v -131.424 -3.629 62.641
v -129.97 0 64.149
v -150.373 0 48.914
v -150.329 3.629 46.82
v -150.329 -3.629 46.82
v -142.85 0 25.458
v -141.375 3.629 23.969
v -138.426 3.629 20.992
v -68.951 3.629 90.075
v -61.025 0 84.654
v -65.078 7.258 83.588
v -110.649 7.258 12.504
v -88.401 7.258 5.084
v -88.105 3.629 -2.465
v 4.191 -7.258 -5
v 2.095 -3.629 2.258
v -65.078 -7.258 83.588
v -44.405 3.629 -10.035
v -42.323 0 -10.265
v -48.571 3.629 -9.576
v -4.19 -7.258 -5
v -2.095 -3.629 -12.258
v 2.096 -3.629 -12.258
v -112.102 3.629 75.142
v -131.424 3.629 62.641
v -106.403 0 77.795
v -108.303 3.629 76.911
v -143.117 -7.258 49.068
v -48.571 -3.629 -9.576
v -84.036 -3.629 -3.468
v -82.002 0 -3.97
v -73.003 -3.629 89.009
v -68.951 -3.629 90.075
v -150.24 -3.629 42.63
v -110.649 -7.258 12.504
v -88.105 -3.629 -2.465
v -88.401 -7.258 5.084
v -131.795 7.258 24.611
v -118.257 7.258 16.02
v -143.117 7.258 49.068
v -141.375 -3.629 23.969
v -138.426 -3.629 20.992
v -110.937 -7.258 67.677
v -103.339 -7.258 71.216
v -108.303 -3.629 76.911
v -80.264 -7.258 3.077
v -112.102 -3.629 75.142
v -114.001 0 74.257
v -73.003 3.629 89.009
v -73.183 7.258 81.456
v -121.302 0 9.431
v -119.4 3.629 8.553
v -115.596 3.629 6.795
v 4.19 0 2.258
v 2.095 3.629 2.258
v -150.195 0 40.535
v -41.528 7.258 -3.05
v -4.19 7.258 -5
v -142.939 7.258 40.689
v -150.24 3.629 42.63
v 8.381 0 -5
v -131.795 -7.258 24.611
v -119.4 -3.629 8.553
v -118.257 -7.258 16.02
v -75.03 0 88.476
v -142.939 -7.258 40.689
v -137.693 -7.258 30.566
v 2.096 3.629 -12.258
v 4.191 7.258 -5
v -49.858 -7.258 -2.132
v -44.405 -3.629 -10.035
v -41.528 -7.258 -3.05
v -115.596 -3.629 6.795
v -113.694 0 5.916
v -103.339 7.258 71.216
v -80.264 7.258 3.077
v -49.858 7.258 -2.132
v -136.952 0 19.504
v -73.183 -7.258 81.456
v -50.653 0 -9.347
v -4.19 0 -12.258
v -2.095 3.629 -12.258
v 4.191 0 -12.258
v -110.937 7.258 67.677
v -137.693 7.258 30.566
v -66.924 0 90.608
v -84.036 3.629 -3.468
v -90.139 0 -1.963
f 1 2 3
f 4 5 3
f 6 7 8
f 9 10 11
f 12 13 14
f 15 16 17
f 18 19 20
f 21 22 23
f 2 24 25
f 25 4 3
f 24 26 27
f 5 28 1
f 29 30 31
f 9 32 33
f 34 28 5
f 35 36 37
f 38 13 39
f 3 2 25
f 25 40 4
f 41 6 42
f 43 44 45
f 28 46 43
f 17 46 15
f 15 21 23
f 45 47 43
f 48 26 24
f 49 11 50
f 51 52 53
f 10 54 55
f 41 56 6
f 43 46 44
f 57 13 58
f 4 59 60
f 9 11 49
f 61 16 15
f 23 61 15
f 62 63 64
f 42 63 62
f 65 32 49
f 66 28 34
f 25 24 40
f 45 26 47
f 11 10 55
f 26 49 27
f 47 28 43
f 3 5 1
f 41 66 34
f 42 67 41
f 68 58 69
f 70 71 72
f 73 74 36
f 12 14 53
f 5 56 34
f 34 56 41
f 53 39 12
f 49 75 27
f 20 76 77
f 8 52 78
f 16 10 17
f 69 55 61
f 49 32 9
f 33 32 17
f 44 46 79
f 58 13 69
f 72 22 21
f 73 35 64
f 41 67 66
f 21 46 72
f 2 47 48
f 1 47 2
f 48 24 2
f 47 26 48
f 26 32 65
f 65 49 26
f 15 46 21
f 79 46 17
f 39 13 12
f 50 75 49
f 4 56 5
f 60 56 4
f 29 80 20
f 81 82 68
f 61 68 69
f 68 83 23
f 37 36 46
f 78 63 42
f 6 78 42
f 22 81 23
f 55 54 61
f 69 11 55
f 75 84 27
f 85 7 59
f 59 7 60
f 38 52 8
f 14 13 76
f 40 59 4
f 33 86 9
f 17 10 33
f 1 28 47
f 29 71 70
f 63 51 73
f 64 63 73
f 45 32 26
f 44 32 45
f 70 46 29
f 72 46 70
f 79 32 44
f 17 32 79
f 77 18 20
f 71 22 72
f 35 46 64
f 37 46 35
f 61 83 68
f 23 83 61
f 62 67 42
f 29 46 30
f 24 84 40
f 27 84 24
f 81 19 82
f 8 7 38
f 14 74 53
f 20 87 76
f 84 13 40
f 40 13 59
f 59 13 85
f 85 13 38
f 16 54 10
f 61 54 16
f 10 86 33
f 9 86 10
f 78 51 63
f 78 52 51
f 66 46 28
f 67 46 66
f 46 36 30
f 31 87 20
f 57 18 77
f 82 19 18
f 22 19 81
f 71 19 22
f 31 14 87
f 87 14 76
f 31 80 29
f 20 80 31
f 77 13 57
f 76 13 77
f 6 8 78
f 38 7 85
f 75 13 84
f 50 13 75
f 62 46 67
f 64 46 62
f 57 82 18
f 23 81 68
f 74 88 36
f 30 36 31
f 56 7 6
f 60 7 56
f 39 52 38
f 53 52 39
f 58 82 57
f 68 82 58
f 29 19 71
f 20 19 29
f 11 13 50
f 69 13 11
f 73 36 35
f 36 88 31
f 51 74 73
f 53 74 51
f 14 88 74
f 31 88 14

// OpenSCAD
// No Preview. Just hit Create.   Always leave Part at 1"
part=1;//[1,2,3,4,5,6]
/* [Hidden] */
LOA=rnd(900,2000);
Stern=LOA*rnd(-0.1,0.3);
Bow=LOA*rnd(-0.1,0.3);
Beam=LOA*rnd(0.05,0.3);
BeamHeight=min(Beam*rnd(0.4,1),LOA*0.1);
SternHeight=BeamHeight*rnd(0.9,3);
BowHeight=max(SternHeight*rnd(0.9,2),BeamHeight*rnd(0.9,3));;

KeelBase=LOA-Stern-Beam;
KeelLine=[
[0,0,0], 
[KeelBase*rnd(0.0,0.3),0,-KeelBase*rnd(-0.1,0.1)], 
[KeelBase*rnd(0.3,0.6),0,-KeelBase*rnd(-0.1,0.1)],
[KeelBase*rnd(0.6,0.9),0,-KeelBase*rnd(-0.1,0.1)],
[KeelBase-1,0,0],
[KeelBase-1,0,0]];
BottomLine=[
[0,0,0],
[KeelBase*rnd(0,0.3),Beam*rnd(0.1,1.5),1],
[KeelBase*rnd(0.3,0.6),Beam*rnd(0.1,2),1],
[KeelBase*rnd(0.6,0.9),Beam*rnd(0.1,3),1],
[KeelBase,0,1],
[KeelBase,0,1]];
bowbend=rnd(-1,3);
WaterLine=[
[-Stern*rnd(0.1,0.9),0,SternHeight/2],
[-Stern*rnd(0.1,0.9),Beam*rnd(0.5,2),SternHeight/2],
[KeelBase*rnd(0,2),Beam*rnd(0.5,3),BeamHeight/2],
[KeelBase+Bow*bowbend,0,BowHeight/2],
[KeelBase+Bow*bowbend,0,BowHeight/2]];
beamstern=[-Stern*rnd(-0.1,1),0,SternHeight];
BeamLine=[
beamstern,
[beamstern[0]+Beam*rnd(0,1),Beam*rnd(0.15,1.5),(BeamHeight+SternHeight)/2],
[KeelBase*rnd(0.0,0.5),Beam*rnd(0.15,2),BeamHeight],
[(KeelBase+Bow)*rnd(0.5,1),Beam*rnd(0.15,2),(BeamHeight+BowHeight)/2],
[KeelBase+Bow,0,BowHeight],
[KeelBase+Bow,0,BowHeight]];
KeelBow=concat(
[
BottomLine[len(BottomLine)-1],
WaterLine[len(WaterLine)-1],
BeamLine[len(BeamLine)-1]]);

SternLine=[BeamLine[0],WaterLine[0],BottomLine[0],KeelLine[0]];
RudderLine=[WaterLine[0]+[0,0,LOA*0.03],WaterLine[0]-[LOA*rnd(0.03,0.2),0,0],BottomLine[0]-[LOA*rnd(0.03,0.2),0,0],KeelLine[0]];
tiny=[0.0001,0.0001,0.0001];
Clinked=rnd(0,1);
openhull=sign(rnd(-1,1));
nummasts= floor(rnd(0,4));
////////////////////////////////////////////////////////////////////////////////////////////////////////////////////////////////////////////////////////



  union(){
 masts(nummasts);
   * BoatHull(0,0,16,Clinked);
    }
//*render()
difference(){
    
    union(){
    if(floor(rnd(0,5))!=0 ||openhull>0){ Railings();}
    BoatHull(0,0,16,Clinked);
    }

    union(){
   if(floor(rnd(0,2))!=0){ Middeck();}
   
    translate(tiny)BoatHull(LOA/50,LOA/50*openhull,16);
    }
 

    }       
if (nummasts>0){
intersection(){    

    mirrorextrudeT(WaterLine,16,0.05,0.99){
    translate([0,-LOA/50,0]) scale(3) cube([LOA/1000,LOA/1000,LOA/200],center=true);
    }    
    
    BoatHull(LOA/400,0,10);
    }}
ctrl();

/////////////////////////////////////////////////////////////////////////////////////////////////////////////////////////////////////////////////////////////////////////////////////////////////////////////////////////////////
module Railings(){
    

mirrorcopy([0,-1,0]){
    extrudeT(BeamLine,16,0,1){
    translate([0,0,0]) scale(2.5) cylinder(LOA/100,LOA/300,LOA/300,center=true,$fn =6);
    }  }
    


extrudeT(KeelBow,16,-0.07,1){
    translate([0,0,-5]) scale(3) cube([LOA/200,LOA/150,LOA/150],center=true);
    }
/*extrudeT(KeelLine,16,0.25,0.91){
    translate([0,0,-5]) scale(3) cube([LOA/1000,LOA/150,LOA/300],center=true);
    }*/

extrudeT(SternLine,16,0,1.2){
    translate([0,0,-5]) scale(3) cube([LOA/200,LOA/200,LOA/150],center=true);
    }
  ! color("RED")hull(){ extrudeT(RudderLine,8,0,1.1){
    translate([0,0,-5]) scale(3) sphere(LOA/400,center=true,$fn=6);
    }}
    
    intersection(){
    cube([LOA*2,LOA/50,LOA*2],center=true);
    BoatHull(-30,10,6);}
}
module masts(n=2){
       m=0.8/(n+0.5);
    i=len(WaterLine)-1 ;
    MastLine=[[max(WaterLine[0][0],BeamLine[0][0]),0,WaterLine[0][2]],[bez2(0.5, WaterLine)[0],0,bez2(0.5, WaterLine)[2]],[min(WaterLine[i][0],BeamLine[i][0]),0,WaterLine[i][2]]];
    
       for (s=[0.05+m:m:0.89]){
      p= bez2(s, MastLine);
       echo(p);
           MH=LOA*rnd(0.5,0.6)+Beam*rnd(0.2,0.2);th=MH*0.03;
   translate(p){   
       if (Beam<LOA*0.1){   cylinder(MH,th*0.5,th*0.2);
           translate([-th*0.25,0,bez2(s, BeamLine)[2]]) rotate([0,rnd(-5,5),-95]){ rotate([90,0,0])cylinder(KeelBase*m,th*0.5,th*0.3);   }}
           else{cylinder(MH,th*0.8,th*0.3);
   translate([th*0.5,0,MH*rnd(0.5,0.70)]) rotate([rnd(0,25),0,0])mirrorcopy([0,-1,0]){ rotate([90,0,0])cylinder(MH*0.5,th*0.5,th*0.3);   }}     
       }}}
    
module Middeck()
{   s=rnd(0.4,0.5);
   e=rnd(0.52,0.63); 
    bh=BeamHeight*rnd(0.3,0.5);
    hull(){
translate([bez2(s, BeamLine)[0],0,bez2(s, BeamLine)[2]])rotate([90,0,0])cylinder(Beam*4,bh,bh,center=true);
translate([bez2(midpoint(s,e), BeamLine)[0],0,bez2(midpoint(s,e), BeamLine)[2]])rotate([90,0,0])cylinder(Beam*4,bh,bh,center=true);
translate([bez2(e, BeamLine)[0],0,bez2(e, BeamLine)[2]])rotate([90,0,0])cylinder(Beam*4,bh,bh,center=true);}
    
    }
module BoatHull(offset=0,offset2=0,D=6,Clinker=0){
hstep=1/D;
vstep=1/(D*0.5);
    HLOA=LOA*0.5;
    offsetscale= (LOA-offset)/LOA;
    
   
for (t=[-0:hstep:1-hstep]){
spar1=[ bez2(t, BeamLine)+[0,0,-offset2],bez2(t, WaterLine),bez2(t, BottomLine),bez2(t, KeelLine)+[0,0,offset]];
spar2=[ bez2(t+hstep, BeamLine)+[0,0,-offset2],bez2(t+hstep, WaterLine),bez2(t+hstep, BottomLine),bez2(t+hstep, KeelLine)+[0,0,offset]];
  
for (v=[0:vstep:1-vstep]){
 
      
    p1=[((bez2(v, spar1)[0]-HLOA)*offsetscale)+HLOA,max(0,bez2(v, spar1)[1] ),bez2(v, spar1)[2]];
    p2=[((bez2(v+vstep, spar1)[0]-HLOA)*offsetscale)+HLOA,max(0,bez2(v+vstep, spar1)[1] ),bez2(v+vstep, spar1)[2]];
    p3=[((bez2(v, spar2)[0]-HLOA)*offsetscale)+HLOA,max(0,bez2(v, spar2)[1] ),bez2(v, spar2)[2]];
    p4=[((bez2(v+vstep, spar2)[0]-HLOA)*offsetscale)+HLOA,max(0,bez2(v+vstep, spar2)[1] ),bez2(v+vstep, spar2)[2]];
    
 p5=p2-[0,LOA/150,0]*SC3(v);
 p6=p4-[0,LOA/150,0]*SC3(v);
if (Clinker >0.5){
intersection(){
hull(){   
translate([0,-offset,0])polyhedron([p1,p5,p3,p6],[[0,2,1],[1,2,3,]]);
translate([0,-2000,0])polyhedron([p1,p5,p3,p6],[[0,2,1],[1,2,3,]]);
}
mirror([0,-1,0])hull(){
    {translate([0,-offset,0])polyhedron([p1,p5,p3,p6],[[0,2,1],[1,2,3,]]);
translate([0,-2000,0])polyhedron([p1,p5,p3,p6],[[0,2,1],[1,2,3,]]);
        }}}
    }
    else{
        
        intersection(){
hull(){   
translate([0,-offset,0])polyhedron([p1,p2,p3,p4],[[0,2,1],[1,2,3,]]);
translate([0,-2000,0])polyhedron([p1,p2,p3,p4],[[0,2,1],[1,2,3,]]);
}
mirror([0,-1,0])hull(){
    {translate([0,-offset,0])polyhedron([p1,p2,p3,p4],[[0,2,1],[1,2,3,]]);
translate([0,-2000,0])polyhedron([p1,p2,p3,p4],[[0,2,1],[1,2,3,]]);
        }}}
        
        
        
        }
    
}
}
    }
    
    module ctrl(){
        
        %color("RED"){mirror([0,-1,0]){

{ShowControl((BottomLine));
ShowControl((WaterLine));
ShowControl((BeamLine));}
}
{ShowControl((KeelLine));
ShowControl((BottomLine));
ShowControl((WaterLine));
ShowControl((BeamLine));}}}


module extrudeT(v,d=8,start=0,stop=1) {
         detail=1/d;
    for(i = [start+detail: detail: stop]) {
       for (j=[0:$children-1]) 
      hull() {
        translate(t(bez2(i,v))) rotate(bez2euler(i, v))scale(bez2(i  , v)[3]) children(j);
        translate(t(bez2(i - detail, v))) rotate(bez2euler(i - detail, v))scale(bez2(i- detail  , v)[3]) children(j);
      }
    }
  }

module mirrorextrudeT(v,d=8,start=0,stop=1) {
         detail=1/d;
    for(i = [start+detail: detail: stop]) {
       for (j=[0:$children-1]) 
      hull() {mirrorcopy([0,-1,0]){
        translate(t(bez2(i,v))) rotate(bez2euler(i, v))scale(bez2(i  , v)[3]) children(j);
        translate(t(bez2(i - detail, v))) rotate(bez2euler(i - detail, v))scale(bez2(i- detail  , v)[3]) children(j);
      }}
    }
  }

  module ShowControl(v)  
  {  // translate(t(v[0])) sphere(v[0][3]);
      for(i=[1:len(v)-1]){
       // vg  translate(t(v[i])) sphere(v[i][3]);
          hull(){
              translate(t(v[i])) sphere(0.5);
              translate(t(v[i-1])) sphere(0.5);
              }          }
      } 
      
      
      
module mirrorcopy(vec=[0,1,0]) 
{ 
    children(); 
    mirror(vec) children(); 
} 
   
 function  subdv(v)=[
  let(last=(len(v)-1)*3)
  for (i=[0:last])
      let(j=floor((i+1)/3))
  
  i%3 == 0?
    v[j]
  :
    i%3  == 2?
       v[j]- un(un(pre(v,j))+un(post(v,j)))*(len3(pre(v,j))+len3(post(v,j)))*0.1
        :
       v[j] +un(un(pre(v,j)) +un(post(v,j)))*(len3(pre(v,j))+len3(post(v,j)))*0.1
 
  ]
  ;     
 function bz2t(v,stop,precision=0.01,t=0,acc=0)=
    acc>=stop||t>1?
    t:
    bz2t(v,stop,precision,t+precision,acc+len3(bez2(t,v)-bez2(t+precision,v)));

function len3bz(v,precision=0.01,t=0,acc=0)=t>1?acc:len3bz(v,precision,t+precision,acc+len3(bez2(t,v)-bez2(t+precision,v)));

function bez2(t, v) = (len(v) > 2) ? bez2(t, [
  for(i = [0: len(v) - 2]) v[i] * t + v[i + 1] * (1 - t)
]): v[0] * t + v[1] * (1 - t);
function lim31(l, v) = v / len3(v) * l;
function len3(v) = sqrt(pow(v[0], 2) + pow(v[1], 2) + pow(v[2], 2));
function bez2euler(i, v) = [0, -asin(bez2v(i, v)[2]), atan2(bez2xy(bez2v(i, v))[1], bez2xy(bez2v(i, v))[0])];
  
function bez2xy(v) = lim31(1, [v[0], v[1], 0]); // down xy projection
function bez2v(i, v) = lim31(1, bez2(i - 0.0001, v) - bez2(i, v)); // unit vector at i
function t(v) = [v[0], v[1], v[2]];
function rndR()=[rands(0,360,1)[0],rands(0,360,1)[1],rands(0,360,1)[0]];
function rndV()=[rands(-1,1,1)[0],rands(-1,1,1)[0],rands(-1,1,1)[0]];
function midpoint(start,end) = start + (end  - start )/2;
function rndc()=[rands(0,1,1)[0],rands(0,1,1)[0],rands(0,1,1)[0]];     
      
      function rnd(a,b)=a+gauss(rands(0,1,1)[0])*(b-a);     

  function t(v) = [v[0], v[1], v[2]];

  
    function un(v) = v / max(len3(v),0.000001) * 1;
function len3(v) = sqrt(pow(v[0], 2) + pow(v[1], 2) + pow(v[2], 2));
  function pre(v,i)= i>0?         (v[i]-v[i-1]):[0,0,0,0];
  function post(v,i)=i<len(v)-1?  (v[i+1]-v[i]):[0,0,0,0] ;
  function SC3 (a)= let( b=clamp(a))(b * b * (3 - 2 * b));
  function clamp (a,b=0,c=10)=min(max(a,b),c);
function gauss(x)=x+(x-SC3(x))*2;;
